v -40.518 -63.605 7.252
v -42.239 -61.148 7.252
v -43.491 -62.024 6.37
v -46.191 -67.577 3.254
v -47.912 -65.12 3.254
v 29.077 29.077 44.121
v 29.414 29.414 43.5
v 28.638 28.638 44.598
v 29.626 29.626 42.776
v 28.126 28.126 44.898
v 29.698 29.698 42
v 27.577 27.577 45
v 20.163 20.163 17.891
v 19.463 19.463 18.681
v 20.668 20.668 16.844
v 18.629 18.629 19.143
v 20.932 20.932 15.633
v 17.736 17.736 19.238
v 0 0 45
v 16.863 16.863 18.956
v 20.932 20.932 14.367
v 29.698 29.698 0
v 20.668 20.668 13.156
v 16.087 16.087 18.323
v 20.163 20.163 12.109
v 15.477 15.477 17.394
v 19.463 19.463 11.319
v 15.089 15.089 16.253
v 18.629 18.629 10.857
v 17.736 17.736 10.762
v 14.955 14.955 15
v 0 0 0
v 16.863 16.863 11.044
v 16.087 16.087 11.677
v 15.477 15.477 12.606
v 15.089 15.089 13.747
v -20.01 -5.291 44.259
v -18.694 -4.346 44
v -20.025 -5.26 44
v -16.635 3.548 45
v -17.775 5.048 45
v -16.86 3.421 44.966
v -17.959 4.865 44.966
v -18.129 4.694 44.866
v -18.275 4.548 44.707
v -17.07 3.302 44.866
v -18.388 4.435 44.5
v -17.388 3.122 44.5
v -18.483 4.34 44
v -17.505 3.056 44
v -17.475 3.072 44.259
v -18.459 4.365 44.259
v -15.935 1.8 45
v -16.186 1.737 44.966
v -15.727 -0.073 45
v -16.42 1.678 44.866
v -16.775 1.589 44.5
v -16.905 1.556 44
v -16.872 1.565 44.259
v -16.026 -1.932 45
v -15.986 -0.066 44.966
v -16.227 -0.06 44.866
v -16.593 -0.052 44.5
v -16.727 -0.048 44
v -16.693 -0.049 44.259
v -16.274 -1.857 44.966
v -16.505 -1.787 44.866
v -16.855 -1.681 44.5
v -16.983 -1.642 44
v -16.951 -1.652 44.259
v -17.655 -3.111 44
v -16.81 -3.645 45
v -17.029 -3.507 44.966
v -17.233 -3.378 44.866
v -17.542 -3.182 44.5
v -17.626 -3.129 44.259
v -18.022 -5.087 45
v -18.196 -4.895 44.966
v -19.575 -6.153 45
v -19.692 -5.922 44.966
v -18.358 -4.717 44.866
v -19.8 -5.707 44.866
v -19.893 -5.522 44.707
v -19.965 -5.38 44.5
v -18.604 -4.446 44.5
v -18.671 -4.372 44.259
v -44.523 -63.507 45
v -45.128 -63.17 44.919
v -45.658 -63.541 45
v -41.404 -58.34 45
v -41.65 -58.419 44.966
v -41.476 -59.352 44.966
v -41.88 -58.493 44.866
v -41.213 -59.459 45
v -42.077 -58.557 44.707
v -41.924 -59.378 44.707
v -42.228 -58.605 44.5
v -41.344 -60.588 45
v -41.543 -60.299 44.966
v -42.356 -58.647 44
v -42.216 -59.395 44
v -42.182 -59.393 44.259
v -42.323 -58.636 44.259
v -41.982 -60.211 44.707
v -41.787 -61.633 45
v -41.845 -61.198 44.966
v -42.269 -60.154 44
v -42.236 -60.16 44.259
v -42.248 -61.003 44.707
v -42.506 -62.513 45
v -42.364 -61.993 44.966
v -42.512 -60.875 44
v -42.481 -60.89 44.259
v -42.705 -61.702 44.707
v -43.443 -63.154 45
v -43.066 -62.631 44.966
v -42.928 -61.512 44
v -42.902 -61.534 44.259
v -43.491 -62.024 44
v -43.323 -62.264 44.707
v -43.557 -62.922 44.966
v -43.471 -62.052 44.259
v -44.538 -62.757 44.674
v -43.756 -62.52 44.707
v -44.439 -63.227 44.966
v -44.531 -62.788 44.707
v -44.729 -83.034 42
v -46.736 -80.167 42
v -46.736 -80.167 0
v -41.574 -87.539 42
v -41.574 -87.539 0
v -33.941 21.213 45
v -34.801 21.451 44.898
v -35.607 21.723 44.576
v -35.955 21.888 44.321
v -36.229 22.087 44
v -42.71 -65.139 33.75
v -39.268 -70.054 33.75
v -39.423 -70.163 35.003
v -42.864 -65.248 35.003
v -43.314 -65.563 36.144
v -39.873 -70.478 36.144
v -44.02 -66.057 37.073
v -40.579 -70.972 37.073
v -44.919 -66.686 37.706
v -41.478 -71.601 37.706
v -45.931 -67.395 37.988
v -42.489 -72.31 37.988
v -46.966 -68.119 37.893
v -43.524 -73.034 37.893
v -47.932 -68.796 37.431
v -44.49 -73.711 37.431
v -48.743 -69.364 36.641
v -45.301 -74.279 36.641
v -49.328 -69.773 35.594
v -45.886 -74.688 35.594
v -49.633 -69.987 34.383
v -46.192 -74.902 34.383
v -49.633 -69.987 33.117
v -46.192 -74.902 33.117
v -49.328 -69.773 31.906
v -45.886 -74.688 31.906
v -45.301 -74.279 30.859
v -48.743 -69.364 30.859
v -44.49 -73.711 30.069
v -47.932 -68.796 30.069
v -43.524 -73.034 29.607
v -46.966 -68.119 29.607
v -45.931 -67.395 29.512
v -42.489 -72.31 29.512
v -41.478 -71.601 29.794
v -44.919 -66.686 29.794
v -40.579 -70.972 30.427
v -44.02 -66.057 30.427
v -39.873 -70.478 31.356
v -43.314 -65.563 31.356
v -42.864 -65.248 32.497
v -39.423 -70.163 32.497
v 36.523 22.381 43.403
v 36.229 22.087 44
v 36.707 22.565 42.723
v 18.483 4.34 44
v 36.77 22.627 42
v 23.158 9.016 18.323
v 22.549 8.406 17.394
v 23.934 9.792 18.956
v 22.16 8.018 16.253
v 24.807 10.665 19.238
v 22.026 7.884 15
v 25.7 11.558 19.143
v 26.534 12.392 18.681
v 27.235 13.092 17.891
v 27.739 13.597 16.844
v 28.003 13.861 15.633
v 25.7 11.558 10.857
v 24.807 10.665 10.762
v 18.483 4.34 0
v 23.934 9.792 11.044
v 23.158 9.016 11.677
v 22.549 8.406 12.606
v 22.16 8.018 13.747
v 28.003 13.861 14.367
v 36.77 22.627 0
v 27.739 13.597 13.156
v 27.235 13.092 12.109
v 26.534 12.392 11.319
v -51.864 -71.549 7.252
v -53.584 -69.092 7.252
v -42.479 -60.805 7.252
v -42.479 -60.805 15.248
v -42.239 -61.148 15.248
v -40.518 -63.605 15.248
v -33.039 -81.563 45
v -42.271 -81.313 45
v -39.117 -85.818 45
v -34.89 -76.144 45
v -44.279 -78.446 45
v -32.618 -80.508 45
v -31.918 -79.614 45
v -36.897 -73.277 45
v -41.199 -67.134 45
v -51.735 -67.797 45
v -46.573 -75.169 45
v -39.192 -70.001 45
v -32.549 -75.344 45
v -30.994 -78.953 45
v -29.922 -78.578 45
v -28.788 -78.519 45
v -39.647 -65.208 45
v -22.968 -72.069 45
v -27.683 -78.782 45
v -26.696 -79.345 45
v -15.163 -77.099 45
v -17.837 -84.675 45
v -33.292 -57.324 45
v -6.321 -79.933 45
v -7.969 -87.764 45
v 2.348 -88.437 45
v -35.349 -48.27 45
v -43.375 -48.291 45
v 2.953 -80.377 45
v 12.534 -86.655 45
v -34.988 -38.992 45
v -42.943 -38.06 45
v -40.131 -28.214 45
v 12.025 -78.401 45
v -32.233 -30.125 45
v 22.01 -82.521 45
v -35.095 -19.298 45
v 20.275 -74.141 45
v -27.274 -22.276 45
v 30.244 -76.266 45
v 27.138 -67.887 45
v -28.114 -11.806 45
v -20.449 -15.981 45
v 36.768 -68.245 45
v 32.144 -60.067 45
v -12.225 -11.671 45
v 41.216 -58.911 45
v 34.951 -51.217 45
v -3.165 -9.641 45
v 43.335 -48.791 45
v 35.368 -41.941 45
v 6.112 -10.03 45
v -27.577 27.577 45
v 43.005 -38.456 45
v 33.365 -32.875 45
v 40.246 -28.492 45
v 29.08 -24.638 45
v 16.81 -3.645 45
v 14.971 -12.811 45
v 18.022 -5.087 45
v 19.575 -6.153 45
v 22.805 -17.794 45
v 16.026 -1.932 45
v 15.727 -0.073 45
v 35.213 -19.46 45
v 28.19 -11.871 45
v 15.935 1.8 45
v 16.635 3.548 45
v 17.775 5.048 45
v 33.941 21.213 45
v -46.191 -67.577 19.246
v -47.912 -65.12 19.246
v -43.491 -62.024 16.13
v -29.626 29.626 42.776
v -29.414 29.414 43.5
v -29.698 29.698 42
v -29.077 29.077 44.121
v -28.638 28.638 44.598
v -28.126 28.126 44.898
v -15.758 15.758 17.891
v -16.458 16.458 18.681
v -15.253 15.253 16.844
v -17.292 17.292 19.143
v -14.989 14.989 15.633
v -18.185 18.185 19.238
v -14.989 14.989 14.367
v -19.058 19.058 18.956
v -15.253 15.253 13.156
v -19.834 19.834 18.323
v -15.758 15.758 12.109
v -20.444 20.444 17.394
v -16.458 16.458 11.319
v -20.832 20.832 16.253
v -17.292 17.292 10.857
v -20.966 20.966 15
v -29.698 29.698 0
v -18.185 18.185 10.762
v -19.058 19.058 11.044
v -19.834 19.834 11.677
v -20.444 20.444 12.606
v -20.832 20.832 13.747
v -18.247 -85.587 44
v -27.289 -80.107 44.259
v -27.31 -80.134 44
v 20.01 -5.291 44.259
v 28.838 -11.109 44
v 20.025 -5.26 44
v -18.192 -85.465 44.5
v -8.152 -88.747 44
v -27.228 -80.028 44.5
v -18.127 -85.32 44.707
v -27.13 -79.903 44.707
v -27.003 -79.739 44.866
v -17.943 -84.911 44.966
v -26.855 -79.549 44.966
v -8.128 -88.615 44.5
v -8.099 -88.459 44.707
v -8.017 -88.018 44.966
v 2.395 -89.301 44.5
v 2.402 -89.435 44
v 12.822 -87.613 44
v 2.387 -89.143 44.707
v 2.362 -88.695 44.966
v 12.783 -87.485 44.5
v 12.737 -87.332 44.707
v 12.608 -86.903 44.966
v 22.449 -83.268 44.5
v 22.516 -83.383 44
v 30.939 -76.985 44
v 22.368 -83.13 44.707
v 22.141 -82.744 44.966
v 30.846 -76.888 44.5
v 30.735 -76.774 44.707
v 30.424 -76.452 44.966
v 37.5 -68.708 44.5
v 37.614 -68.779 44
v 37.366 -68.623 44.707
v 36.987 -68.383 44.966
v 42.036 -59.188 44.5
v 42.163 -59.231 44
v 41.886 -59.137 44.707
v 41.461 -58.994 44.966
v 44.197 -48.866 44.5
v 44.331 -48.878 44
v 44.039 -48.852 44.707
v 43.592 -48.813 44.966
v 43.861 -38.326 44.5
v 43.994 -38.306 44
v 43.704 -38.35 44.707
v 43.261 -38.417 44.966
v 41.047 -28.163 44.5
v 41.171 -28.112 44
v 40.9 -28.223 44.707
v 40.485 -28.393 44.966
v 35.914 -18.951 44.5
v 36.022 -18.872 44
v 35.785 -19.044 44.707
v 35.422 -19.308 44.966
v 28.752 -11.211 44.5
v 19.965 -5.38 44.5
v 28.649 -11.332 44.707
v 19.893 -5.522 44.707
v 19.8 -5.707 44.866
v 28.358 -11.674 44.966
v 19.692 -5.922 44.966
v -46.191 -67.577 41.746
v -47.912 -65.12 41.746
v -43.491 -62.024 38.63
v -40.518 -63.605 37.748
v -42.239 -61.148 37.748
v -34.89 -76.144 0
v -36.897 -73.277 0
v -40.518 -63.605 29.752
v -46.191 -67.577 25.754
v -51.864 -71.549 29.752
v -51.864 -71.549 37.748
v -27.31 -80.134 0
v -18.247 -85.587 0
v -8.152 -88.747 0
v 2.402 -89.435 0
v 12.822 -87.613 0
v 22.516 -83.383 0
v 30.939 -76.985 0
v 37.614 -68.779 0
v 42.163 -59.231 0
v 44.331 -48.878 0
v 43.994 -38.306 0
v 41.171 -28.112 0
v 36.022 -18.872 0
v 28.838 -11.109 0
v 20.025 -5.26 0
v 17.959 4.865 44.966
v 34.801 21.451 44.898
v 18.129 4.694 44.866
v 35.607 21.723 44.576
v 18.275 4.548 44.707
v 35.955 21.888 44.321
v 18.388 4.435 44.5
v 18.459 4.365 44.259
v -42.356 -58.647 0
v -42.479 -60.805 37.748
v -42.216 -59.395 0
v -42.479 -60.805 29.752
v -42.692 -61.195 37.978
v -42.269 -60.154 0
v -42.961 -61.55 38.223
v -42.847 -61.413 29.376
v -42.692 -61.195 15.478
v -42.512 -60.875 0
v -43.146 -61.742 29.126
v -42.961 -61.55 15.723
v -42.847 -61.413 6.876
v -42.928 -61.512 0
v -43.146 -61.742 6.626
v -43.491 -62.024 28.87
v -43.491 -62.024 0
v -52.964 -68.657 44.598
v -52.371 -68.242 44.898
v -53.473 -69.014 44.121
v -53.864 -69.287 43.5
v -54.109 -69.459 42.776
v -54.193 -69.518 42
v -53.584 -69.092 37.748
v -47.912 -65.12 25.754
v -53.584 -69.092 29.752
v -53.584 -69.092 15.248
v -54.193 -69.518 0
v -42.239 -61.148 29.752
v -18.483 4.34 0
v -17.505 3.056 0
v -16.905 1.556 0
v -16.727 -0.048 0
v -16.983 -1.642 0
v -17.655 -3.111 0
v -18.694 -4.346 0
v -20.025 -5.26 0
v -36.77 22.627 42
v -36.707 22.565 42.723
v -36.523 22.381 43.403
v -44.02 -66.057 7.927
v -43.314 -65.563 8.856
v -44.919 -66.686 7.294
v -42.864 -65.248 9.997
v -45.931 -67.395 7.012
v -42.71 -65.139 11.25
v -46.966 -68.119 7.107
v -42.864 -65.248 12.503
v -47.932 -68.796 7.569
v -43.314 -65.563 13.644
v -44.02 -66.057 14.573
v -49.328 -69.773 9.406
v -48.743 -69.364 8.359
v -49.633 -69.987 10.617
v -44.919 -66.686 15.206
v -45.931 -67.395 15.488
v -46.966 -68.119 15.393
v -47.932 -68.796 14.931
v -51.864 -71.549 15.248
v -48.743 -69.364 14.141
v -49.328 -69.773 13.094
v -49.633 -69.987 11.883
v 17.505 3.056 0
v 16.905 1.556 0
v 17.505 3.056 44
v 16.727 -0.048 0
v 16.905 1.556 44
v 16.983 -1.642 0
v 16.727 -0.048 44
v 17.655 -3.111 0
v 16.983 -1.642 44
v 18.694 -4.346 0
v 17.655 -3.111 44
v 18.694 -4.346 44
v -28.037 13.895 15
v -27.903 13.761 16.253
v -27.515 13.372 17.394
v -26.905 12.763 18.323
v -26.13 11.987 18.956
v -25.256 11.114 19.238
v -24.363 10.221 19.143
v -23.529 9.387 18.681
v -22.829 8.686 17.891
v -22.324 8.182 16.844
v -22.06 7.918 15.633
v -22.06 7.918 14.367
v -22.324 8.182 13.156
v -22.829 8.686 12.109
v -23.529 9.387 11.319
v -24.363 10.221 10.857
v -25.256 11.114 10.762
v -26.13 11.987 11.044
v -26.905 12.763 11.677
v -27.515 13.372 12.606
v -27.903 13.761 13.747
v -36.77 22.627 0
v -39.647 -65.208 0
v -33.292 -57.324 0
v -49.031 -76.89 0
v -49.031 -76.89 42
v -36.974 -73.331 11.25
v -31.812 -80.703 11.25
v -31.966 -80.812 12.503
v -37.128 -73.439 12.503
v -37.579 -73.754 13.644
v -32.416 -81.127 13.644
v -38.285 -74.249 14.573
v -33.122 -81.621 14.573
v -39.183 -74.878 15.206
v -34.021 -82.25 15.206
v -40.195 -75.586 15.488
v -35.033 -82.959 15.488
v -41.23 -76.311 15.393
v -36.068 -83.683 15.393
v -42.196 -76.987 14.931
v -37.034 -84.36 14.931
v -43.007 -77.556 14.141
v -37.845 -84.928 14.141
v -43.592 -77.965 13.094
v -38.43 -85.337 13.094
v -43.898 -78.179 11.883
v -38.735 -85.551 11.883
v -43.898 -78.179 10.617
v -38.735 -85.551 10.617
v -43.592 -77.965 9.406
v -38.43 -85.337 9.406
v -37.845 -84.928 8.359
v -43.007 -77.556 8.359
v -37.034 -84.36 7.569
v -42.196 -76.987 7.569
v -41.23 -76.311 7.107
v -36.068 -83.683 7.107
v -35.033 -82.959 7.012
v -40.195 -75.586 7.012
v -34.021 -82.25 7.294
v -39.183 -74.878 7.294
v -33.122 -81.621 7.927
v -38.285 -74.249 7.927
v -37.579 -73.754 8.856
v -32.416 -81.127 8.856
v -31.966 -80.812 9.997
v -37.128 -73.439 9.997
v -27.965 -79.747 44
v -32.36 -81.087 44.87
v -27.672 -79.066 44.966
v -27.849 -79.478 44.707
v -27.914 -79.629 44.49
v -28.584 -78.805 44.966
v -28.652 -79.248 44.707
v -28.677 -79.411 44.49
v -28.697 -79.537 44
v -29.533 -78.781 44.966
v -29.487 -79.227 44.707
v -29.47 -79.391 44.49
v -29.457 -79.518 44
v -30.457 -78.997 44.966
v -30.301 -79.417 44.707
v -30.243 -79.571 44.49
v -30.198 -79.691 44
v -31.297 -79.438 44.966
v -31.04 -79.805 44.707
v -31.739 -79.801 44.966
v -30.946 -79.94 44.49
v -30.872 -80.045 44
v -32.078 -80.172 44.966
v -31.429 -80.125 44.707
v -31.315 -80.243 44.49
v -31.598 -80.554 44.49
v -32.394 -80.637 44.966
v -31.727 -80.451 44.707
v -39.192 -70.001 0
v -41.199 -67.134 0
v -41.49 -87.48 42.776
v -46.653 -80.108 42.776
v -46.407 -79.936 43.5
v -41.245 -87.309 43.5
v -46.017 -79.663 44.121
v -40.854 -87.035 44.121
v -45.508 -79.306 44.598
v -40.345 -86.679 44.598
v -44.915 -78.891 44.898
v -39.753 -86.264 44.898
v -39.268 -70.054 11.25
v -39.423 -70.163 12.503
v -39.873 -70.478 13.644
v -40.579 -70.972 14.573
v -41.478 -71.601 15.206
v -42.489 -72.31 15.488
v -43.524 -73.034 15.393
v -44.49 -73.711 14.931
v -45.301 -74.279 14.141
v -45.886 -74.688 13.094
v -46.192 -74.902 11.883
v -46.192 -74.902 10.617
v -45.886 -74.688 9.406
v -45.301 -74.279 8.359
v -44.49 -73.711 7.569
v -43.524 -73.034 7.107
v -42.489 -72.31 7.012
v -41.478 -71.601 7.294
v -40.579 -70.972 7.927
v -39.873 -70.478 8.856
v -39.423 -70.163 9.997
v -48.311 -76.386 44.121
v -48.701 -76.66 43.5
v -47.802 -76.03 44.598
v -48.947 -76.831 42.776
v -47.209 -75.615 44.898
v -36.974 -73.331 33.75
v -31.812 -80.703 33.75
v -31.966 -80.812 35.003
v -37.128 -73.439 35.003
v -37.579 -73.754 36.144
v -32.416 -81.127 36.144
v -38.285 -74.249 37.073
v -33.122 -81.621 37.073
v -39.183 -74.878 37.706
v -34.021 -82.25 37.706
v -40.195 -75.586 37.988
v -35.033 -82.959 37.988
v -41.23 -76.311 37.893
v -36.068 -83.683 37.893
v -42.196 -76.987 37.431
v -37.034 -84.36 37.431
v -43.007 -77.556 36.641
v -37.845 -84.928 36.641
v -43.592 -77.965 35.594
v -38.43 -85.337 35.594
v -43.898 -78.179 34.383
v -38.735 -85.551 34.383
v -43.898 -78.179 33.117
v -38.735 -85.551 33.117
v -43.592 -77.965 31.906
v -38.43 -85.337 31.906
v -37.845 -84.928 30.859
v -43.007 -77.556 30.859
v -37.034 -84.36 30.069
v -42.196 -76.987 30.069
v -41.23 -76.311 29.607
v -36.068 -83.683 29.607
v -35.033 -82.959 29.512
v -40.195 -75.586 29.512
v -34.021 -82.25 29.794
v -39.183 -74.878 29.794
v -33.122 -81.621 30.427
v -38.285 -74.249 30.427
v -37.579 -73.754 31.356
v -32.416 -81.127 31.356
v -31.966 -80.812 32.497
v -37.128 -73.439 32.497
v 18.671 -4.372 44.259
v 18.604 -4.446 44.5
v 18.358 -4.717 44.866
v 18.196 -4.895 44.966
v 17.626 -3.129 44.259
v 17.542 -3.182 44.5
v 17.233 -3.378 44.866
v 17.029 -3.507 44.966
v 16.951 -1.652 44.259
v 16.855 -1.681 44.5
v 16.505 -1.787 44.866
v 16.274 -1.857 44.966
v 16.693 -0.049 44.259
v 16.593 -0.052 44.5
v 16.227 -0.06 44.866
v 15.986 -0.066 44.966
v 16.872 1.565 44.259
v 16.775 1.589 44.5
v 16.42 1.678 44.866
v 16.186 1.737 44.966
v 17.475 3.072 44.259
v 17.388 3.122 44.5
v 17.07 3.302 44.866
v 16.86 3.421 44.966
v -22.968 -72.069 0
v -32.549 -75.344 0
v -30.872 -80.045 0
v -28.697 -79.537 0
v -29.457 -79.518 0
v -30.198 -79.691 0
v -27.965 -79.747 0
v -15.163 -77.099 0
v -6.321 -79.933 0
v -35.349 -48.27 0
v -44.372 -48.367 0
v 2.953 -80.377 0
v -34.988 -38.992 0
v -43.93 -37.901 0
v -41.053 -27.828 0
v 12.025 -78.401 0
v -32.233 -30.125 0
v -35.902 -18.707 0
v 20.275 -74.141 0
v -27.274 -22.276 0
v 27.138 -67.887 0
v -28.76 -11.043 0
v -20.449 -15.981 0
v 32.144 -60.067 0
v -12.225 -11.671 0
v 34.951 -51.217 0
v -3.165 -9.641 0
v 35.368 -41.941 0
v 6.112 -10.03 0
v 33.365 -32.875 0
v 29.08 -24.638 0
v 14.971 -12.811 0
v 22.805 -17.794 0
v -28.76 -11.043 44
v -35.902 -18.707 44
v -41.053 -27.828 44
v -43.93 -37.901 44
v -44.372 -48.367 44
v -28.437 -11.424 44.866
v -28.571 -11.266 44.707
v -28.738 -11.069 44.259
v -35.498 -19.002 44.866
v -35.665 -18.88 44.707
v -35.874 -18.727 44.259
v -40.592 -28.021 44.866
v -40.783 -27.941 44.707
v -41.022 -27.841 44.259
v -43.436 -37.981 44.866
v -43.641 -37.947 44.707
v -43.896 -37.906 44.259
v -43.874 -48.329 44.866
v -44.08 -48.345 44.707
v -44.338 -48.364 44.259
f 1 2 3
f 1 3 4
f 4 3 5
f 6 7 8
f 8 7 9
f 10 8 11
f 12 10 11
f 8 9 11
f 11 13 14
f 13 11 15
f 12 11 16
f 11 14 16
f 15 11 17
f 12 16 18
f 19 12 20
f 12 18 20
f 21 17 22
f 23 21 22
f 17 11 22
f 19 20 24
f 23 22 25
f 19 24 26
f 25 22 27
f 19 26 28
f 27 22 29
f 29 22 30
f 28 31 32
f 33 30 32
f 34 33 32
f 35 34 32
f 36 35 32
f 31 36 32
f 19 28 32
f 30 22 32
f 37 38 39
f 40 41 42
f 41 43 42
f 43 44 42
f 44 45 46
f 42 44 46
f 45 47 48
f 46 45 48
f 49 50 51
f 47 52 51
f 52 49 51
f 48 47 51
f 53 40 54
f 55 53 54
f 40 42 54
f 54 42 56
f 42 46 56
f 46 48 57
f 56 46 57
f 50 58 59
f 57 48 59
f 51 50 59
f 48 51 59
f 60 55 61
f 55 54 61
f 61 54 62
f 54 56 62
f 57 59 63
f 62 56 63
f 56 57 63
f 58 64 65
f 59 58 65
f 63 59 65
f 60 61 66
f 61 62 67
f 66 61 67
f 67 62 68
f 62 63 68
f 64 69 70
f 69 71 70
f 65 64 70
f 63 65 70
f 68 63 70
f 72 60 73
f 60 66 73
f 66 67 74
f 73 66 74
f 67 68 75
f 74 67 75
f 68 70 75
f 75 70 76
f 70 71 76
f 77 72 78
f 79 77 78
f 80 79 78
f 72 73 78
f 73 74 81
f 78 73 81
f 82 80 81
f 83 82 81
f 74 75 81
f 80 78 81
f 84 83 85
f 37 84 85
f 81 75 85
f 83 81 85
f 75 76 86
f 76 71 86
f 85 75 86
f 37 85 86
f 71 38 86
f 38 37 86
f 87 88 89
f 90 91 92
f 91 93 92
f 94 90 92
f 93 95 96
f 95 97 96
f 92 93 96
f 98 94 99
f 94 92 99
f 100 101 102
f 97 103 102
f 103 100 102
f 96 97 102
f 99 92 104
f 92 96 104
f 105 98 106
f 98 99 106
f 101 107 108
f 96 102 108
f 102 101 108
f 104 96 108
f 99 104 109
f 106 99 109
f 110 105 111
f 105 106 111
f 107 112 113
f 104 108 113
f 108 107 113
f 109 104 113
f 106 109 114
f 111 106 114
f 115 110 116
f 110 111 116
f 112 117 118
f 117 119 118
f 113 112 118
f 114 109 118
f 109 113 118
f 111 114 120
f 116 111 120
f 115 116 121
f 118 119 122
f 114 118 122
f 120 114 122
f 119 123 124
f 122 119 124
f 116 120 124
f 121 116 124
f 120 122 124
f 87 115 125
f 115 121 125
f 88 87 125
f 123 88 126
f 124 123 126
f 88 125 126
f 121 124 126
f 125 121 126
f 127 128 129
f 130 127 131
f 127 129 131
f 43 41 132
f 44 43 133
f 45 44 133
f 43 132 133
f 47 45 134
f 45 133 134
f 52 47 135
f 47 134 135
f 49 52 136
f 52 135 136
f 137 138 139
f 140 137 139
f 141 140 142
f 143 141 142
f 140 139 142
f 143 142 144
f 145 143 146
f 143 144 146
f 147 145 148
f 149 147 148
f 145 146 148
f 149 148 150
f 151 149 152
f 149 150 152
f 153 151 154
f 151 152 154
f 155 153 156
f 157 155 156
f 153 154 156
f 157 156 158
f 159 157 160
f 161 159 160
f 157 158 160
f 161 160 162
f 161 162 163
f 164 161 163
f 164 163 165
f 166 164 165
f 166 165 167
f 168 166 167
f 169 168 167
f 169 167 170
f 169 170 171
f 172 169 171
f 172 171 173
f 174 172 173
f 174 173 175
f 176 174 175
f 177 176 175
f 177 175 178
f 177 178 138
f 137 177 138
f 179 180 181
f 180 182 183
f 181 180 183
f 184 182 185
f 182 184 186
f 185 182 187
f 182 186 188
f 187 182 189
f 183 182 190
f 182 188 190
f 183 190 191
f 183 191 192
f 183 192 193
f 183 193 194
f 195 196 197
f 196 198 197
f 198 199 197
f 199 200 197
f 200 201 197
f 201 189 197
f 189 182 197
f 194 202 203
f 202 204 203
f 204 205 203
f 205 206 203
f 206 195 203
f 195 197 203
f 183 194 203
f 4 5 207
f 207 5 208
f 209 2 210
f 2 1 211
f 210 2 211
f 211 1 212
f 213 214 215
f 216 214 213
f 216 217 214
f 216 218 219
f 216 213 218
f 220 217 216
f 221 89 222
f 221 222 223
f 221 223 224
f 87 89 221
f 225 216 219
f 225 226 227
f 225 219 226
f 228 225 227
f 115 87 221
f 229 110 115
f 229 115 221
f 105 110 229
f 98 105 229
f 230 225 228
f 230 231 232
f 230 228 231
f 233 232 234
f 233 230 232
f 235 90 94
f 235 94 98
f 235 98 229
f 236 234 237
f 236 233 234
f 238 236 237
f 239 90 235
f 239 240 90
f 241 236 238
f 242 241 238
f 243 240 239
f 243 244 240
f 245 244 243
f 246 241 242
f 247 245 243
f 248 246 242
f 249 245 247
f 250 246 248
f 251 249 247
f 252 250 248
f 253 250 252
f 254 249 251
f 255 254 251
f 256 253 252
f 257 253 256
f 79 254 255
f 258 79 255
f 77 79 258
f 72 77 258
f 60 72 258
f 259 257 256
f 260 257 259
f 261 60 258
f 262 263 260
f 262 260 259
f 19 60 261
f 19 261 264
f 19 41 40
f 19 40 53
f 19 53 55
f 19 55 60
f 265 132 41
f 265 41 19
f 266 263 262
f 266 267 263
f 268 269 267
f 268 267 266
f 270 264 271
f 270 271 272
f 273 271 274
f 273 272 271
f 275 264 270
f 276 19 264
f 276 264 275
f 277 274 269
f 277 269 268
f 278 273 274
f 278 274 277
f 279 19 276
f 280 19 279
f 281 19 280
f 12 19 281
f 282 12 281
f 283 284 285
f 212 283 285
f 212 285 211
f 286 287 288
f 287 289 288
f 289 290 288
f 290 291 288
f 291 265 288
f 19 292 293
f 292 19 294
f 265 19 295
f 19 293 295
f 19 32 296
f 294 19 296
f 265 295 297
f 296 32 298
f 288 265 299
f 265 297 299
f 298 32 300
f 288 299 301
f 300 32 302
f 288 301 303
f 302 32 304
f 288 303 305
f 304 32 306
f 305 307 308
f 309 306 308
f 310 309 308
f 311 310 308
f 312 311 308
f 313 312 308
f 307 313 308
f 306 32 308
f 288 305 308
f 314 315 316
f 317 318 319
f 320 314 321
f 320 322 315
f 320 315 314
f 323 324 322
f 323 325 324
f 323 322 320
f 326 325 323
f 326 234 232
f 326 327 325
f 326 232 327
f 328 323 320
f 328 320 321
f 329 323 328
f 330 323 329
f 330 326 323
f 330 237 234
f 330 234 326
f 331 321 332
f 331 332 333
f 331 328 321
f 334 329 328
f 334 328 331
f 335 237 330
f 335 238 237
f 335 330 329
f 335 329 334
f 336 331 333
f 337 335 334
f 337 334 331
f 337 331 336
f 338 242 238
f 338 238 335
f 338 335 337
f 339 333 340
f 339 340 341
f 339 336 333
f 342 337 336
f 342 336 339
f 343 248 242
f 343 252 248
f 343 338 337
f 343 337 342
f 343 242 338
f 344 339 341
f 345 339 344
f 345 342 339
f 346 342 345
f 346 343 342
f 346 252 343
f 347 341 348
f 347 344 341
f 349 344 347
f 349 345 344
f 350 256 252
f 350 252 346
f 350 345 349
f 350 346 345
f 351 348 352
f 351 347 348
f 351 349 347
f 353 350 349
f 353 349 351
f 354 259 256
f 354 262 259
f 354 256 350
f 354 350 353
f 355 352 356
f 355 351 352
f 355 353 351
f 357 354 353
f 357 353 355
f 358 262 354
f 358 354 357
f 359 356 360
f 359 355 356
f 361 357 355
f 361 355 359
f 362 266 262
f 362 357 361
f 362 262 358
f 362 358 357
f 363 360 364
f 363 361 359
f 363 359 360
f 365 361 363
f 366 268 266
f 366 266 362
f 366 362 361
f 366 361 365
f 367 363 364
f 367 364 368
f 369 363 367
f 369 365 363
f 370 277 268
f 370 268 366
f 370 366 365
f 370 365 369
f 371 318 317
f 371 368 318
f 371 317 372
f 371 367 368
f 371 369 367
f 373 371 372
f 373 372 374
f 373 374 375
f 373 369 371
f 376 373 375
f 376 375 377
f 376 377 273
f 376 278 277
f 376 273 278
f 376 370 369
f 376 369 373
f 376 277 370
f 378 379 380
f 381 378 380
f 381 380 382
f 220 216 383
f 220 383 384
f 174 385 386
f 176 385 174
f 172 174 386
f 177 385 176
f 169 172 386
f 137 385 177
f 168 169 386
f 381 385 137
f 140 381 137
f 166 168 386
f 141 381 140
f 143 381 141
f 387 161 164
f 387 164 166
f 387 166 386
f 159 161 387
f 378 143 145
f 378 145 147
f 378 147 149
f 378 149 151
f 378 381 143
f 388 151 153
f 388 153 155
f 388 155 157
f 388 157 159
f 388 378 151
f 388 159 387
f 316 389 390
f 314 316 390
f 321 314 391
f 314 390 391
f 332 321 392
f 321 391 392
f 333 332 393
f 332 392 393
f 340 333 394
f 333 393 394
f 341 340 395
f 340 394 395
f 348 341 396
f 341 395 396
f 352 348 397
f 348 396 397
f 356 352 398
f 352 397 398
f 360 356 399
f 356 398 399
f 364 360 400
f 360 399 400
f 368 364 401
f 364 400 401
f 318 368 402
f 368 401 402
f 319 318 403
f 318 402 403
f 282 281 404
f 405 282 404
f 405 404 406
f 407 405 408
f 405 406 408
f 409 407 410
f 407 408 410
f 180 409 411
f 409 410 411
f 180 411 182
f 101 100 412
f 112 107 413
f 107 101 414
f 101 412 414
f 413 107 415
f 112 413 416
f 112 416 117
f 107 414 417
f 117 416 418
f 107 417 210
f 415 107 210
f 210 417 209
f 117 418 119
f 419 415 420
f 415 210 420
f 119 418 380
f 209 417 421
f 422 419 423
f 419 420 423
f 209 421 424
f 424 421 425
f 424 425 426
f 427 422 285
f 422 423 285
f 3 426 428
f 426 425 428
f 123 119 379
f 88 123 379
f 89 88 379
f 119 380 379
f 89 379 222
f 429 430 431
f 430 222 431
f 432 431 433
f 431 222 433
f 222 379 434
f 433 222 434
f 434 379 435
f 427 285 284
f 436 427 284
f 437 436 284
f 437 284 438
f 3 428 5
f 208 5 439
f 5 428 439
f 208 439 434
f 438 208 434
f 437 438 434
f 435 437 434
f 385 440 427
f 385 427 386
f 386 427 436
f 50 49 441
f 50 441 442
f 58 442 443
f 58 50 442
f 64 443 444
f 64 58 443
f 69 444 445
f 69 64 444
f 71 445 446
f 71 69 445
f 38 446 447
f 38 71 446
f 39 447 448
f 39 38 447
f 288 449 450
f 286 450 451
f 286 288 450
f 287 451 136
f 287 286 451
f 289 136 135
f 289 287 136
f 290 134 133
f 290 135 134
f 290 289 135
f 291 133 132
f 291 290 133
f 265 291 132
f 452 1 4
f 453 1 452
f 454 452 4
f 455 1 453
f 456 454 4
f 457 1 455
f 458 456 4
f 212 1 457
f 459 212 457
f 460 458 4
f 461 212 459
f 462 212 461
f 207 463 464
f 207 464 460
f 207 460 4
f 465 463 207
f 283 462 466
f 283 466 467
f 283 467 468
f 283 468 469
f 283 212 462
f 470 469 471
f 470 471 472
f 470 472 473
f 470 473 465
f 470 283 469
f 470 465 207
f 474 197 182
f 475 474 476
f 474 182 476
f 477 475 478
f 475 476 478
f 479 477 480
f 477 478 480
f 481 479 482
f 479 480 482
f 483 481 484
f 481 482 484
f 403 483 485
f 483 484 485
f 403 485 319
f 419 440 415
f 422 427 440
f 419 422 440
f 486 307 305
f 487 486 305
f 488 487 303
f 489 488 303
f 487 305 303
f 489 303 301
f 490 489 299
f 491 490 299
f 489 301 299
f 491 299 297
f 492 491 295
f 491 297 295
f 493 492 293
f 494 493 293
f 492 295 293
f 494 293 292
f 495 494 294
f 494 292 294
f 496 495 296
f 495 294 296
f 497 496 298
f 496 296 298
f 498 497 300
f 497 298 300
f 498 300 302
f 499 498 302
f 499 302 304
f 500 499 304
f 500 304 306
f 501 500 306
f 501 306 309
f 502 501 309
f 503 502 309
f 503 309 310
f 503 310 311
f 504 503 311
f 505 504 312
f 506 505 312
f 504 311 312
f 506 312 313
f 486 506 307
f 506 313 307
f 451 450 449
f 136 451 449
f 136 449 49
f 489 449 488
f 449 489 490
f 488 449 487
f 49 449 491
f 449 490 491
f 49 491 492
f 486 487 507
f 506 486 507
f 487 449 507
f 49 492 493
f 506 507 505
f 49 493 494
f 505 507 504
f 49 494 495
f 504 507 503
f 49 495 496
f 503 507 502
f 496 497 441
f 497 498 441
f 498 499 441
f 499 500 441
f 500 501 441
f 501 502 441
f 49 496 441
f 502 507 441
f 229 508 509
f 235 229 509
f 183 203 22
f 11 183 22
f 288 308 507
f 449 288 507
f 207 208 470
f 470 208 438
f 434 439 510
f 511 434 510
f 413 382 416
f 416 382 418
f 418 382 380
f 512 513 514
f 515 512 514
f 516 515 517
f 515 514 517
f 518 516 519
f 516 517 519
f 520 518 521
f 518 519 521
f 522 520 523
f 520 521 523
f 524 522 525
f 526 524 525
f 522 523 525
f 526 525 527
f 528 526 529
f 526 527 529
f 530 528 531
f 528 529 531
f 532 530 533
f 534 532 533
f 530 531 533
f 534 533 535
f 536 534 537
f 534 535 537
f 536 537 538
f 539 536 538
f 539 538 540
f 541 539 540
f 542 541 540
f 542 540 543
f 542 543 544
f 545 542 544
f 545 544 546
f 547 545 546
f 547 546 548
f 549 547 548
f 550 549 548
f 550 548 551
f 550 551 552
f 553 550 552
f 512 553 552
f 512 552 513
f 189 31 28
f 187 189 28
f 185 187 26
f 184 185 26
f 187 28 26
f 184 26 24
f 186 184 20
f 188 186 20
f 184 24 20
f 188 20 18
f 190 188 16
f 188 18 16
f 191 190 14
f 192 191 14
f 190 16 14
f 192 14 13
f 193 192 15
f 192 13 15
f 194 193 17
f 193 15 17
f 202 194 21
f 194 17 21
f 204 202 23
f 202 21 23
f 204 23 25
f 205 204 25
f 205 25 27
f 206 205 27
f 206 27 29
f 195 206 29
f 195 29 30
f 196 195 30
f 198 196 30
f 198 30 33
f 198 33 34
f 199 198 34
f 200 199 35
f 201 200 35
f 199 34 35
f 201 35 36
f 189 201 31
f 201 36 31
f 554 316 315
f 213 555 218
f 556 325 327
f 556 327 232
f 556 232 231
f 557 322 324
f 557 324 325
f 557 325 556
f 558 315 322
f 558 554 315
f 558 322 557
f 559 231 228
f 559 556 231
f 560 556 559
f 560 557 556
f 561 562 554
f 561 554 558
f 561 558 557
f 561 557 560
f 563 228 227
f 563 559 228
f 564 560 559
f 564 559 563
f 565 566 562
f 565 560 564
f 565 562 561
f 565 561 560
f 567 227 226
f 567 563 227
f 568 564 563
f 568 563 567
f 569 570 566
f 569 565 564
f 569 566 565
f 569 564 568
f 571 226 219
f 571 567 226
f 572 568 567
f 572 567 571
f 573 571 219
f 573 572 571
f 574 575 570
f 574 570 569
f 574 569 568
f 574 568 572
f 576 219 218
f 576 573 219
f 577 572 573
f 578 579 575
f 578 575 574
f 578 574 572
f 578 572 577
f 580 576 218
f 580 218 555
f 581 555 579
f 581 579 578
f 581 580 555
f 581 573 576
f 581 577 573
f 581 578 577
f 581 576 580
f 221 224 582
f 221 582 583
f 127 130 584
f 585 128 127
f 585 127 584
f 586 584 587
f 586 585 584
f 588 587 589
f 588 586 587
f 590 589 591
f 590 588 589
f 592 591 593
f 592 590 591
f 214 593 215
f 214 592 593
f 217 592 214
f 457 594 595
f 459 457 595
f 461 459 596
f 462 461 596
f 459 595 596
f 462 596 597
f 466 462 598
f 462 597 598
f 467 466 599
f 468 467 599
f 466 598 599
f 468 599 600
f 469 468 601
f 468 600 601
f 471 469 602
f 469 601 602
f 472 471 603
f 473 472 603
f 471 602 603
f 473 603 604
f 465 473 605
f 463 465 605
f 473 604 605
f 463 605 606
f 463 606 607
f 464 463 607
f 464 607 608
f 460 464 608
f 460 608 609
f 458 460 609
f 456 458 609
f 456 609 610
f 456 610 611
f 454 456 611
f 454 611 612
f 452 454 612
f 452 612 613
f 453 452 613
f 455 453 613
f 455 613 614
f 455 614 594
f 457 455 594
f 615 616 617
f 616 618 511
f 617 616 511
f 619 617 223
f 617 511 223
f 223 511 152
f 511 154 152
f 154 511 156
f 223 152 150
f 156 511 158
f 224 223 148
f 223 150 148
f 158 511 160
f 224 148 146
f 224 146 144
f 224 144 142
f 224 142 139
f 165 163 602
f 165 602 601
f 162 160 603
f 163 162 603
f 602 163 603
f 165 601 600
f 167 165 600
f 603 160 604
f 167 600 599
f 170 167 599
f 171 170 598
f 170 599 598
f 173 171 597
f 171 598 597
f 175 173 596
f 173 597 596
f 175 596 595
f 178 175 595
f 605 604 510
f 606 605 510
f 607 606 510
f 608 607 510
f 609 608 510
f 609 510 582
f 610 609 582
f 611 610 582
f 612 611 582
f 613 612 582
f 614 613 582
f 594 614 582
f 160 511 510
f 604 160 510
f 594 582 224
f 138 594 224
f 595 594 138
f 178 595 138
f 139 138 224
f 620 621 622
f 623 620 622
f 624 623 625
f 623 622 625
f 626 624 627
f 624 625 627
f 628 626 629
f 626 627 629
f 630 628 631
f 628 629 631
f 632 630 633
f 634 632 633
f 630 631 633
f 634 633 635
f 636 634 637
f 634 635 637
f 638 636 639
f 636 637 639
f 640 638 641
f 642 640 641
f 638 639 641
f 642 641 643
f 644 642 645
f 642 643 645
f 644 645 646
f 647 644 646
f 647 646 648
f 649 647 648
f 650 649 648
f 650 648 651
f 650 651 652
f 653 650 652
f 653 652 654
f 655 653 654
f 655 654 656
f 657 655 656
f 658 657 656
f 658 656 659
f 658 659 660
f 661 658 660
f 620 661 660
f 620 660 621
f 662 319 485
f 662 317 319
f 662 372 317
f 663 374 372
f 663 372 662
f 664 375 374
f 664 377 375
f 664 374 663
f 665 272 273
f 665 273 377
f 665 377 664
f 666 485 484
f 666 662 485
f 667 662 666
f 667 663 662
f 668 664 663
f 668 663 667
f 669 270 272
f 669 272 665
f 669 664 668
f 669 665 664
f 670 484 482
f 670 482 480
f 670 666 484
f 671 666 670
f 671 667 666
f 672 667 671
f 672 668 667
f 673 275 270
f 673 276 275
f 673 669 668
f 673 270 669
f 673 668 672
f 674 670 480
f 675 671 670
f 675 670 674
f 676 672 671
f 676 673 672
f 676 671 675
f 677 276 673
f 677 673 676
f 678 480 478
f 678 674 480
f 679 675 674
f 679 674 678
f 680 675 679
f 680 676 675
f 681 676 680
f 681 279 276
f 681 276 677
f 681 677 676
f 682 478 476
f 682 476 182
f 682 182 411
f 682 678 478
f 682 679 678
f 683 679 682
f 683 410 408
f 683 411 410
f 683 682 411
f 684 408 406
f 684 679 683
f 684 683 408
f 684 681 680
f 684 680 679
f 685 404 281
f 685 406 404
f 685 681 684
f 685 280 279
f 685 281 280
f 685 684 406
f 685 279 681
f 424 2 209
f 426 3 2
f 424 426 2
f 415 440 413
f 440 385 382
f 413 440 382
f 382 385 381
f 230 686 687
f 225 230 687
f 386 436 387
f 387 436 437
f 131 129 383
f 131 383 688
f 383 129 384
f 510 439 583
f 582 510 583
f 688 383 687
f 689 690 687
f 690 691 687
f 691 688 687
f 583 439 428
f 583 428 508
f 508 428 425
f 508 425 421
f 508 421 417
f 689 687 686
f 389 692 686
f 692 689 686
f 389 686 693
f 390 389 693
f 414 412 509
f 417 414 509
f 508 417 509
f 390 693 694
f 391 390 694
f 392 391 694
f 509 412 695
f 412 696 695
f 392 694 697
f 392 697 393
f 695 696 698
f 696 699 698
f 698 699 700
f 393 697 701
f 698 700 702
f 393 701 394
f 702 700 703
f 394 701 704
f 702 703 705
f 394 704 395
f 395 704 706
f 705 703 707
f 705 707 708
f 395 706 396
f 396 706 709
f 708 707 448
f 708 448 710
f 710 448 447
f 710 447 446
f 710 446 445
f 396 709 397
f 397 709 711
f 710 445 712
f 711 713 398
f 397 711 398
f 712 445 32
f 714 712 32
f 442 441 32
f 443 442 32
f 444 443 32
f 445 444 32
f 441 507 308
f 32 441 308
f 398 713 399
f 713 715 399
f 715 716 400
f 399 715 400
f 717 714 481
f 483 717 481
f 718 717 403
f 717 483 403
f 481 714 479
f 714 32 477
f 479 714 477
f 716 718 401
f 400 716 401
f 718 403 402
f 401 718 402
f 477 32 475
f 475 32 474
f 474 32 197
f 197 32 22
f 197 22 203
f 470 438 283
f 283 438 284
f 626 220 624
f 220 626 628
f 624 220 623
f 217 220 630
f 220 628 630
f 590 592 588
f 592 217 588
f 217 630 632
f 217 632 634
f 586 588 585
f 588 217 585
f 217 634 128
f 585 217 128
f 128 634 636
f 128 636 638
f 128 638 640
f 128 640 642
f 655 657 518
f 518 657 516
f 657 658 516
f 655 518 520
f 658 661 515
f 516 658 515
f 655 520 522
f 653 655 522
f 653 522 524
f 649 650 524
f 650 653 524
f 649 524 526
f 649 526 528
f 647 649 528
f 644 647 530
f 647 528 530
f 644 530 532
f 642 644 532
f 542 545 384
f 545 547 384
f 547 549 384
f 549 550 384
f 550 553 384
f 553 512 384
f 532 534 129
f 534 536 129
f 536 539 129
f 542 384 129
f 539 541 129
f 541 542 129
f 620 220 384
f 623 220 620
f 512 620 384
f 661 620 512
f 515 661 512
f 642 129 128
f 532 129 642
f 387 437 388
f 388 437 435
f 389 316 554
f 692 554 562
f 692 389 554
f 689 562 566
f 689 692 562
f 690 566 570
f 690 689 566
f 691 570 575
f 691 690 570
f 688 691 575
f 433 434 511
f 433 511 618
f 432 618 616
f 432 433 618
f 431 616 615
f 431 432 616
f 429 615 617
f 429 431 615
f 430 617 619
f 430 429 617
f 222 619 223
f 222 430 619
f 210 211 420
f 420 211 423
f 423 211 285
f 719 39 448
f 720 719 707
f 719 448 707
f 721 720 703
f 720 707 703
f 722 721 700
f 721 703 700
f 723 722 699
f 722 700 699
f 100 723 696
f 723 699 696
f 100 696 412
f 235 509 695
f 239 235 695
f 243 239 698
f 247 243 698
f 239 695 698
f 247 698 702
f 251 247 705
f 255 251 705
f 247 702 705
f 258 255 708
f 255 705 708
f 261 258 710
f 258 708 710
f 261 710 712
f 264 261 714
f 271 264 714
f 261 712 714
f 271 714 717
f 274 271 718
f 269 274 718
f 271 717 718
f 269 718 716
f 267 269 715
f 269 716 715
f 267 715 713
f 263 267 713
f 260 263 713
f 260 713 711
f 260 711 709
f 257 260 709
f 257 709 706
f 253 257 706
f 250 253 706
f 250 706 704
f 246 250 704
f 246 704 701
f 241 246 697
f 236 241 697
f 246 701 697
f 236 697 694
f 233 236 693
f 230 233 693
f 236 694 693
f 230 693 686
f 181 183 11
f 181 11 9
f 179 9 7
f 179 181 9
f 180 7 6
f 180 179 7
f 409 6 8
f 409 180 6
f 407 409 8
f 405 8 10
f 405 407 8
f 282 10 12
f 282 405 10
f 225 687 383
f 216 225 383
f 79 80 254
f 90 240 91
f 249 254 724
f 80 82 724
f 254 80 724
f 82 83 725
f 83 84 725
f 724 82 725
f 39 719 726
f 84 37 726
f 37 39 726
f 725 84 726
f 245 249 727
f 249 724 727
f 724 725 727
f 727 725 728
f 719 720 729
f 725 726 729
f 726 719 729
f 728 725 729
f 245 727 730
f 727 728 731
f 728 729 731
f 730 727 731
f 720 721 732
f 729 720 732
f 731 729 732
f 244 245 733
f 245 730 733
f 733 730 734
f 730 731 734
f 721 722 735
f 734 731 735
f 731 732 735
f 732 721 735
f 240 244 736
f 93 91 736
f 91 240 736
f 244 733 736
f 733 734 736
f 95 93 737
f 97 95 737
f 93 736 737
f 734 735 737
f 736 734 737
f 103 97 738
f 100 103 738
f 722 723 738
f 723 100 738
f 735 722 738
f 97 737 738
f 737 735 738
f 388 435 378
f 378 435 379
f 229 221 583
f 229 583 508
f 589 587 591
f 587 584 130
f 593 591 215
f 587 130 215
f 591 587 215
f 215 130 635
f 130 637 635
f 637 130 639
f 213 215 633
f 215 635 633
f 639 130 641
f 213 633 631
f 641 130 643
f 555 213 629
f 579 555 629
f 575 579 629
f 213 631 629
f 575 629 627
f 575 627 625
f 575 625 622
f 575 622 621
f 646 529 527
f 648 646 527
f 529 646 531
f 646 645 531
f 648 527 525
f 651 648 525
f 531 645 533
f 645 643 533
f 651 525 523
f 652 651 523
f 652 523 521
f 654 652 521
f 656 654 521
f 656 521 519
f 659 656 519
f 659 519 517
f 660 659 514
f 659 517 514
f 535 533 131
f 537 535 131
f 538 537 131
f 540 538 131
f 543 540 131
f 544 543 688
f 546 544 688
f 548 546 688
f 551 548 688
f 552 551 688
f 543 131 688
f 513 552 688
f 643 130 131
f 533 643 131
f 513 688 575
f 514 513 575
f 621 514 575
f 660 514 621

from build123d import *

# Parameters (mm, degrees)
F1_DEPTH      = 45
F2_R          = 4.25
F3_DEPTH      = 10
F4_R          = 4.25
F5_DEPTH      = 10
F6_R          = 4.25
F7_DEPTH      = 22
F9_DEPTH      = 3
F10_R         = 6
F11_T1_DEPTH  = 45
F11_T6_DEPTH  = 45
F11_T11_DEPTH = 50.6773888561
F11_T16_DEPTH = 56.3547777122
F11_T22_DEPTH = 50.6773888561
F11_T24_DEPTH = 24
F11_T26_DEPTH = 24
F11_T28_DEPTH = 25
F11_T30_DEPTH = 25
F12_T3_ANGLE  = 191.1142548037
F12_T6_ANGLE  = 120.6172934525
F12_T9_ANGLE  = 108.2560127517
F12_T12_DEPTH = 25.3616591831
F12_T15_DEPTH = 25.3616591831
F12_T18_ANGLE = 108.2560127517
F12_T21_ANGLE = 120.6172934336
F12_T24_ANGLE = 81.1142548036


# Not quite as in the source:
# - a fillet or chamfer that OpenCascade refuses, or shapes differently, is made with other operations: its cross-section is extruded or revolved along the edge and cut away or added


with BuildPart() as f1:
    # F0 (on Top) → F1 (new body)
    with BuildSketch(Plane.XY):
        with BuildLine():
            Line((29.6984848098, 29.6984848098), (0, 0))
            Line((0, 0), (-29.6984848098, 29.6984848098))
            Line((-29.6984848098, 29.6984848098), (-36.7695526217, 22.627416998))
            Line((-36.7695526217, 22.627416998), (-11.9950181388, -2.1471174849))
            ThreePointArc((-11.9950181388, -2.1471174849), (-39.7071381913, -24.9103714156), (-41.6303752657, -60.7213821032))
            ThreePointArc((-41.6303752657, -60.7213821032), (-40.7005404194, -62.9921096474), (-39.6469587391, -65.2081335788))
            Line((-39.6469587391, -65.2081335788), (-33.2920408775, -57.324366686))
            ThreePointArc((-33.2920408775, -57.324366686), (29.0798975723, -24.6380365095), (-22.9676650232, -72.0691034832))
            Line((-22.9676650232, -72.0691034832), (-32.5494925143, -75.3443658208))
            ThreePointArc((-32.5494925143, -75.3443658208), (-30.8274573358, -77.0923335738), (-29.011693666, -78.7427270775))
            ThreePointArc((-29.011693666, -78.7427270775), (39.2315391454, -66.0032458512), (11.9950181388, -2.1471174849))
            Line((11.9950181388, -2.1471174849), (36.7695526217, 22.627416998))
            Line((36.7695526217, 22.627416998), (29.6984848098, 29.6984848098))
        make_face()
        with BuildLine():
            ThreePointArc((-39.6469587391, -65.2081335788), (-40.7005404194, -62.9921096474), (-41.6303752657, -60.7213821032))
            Line((-41.6303752657, -60.7213821032), (-54.1929009582, -69.517757292))
            Line((-54.1929009582, -69.517757292), (-49.0307130311, -76.8901256906))
            Line((-49.0307130311, -76.8901256906), (-39.1915368437, -70.0006603545))
            Line((-39.1915368437, -70.0006603545), (-41.1990543709, -67.1336281995))
            Line((-41.1990543709, -67.1336281995), (-39.6469587391, -65.2081335788))
        make_face()
        with BuildLine():
            Line((-41.5742193585, -87.5391022664), (-29.011693666, -78.7427270775))
            ThreePointArc((-29.011693666, -78.7427270775), (-30.8274573358, -77.0923335738), (-32.5494925143, -75.3443658208))
            Line((-32.5494925143, -75.3443658208), (-34.8897135711, -76.1443006866))
            Line((-34.8897135711, -76.1443006866), (-36.8972310983, -73.2772685316))
            Line((-36.8972310983, -73.2772685316), (-46.7364072857, -80.1667338678))
            Line((-46.7364072857, -80.1667338678), (-41.5742193585, -87.5391022664))
        make_face()
    extrude(amount=F1_DEPTH)

    # F2 (on face) → F3 (cut, through all)
    with BuildSketch(Plane(origin=(0, 0, 0), x_dir=(-0.7071067812, -0.7071067812, 0), z_dir=(-0.7071067812, 0.7071067812, 0))):
        with Locations((-25.4, 15)):
            Circle(F2_R)
    extrude(amount=-F3_DEPTH, mode=Mode.SUBTRACT)

    # F4 (on face) → F5 (cut, through all)
    with BuildSketch(Plane(origin=(0, 0, 0), x_dir=(-0.7071067812, 0.7071067812, 0), z_dir=(0.7071067812, 0.7071067812, 0))):
        with Locations((25.4, 15)):
            Circle(F4_R)
    extrude(amount=-F5_DEPTH, mode=Mode.SUBTRACT)

    # F6 (on face) → F7 (cut, through all)
    with BuildSketch(Plane(origin=(27.4524247675, -39.206125712, 0), x_dir=(0.8191520443, 0.5735764364, 0), z_dir=(0.5735764364, -0.8191520443, 0))):
        with Locations((-76.5979670285, 33.75)):
            Circle(F6_R)
        with Locations((-76.5979670285, 11.25)):
            Circle(F6_R)
    extrude(amount=-F7_DEPTH, mode=Mode.SUBTRACT)

    # F8 (on face) → F9 (cut)
    with BuildSketch(Plane(origin=(14.8337431678, -21.1847807376, 0), x_dir=(-0.8191520443, -0.5735764364, 0), z_dir=(-0.5735764364, 0.8191520443, 0))):
        Polygon((83.5229670285, 37.7481506141), (76.5979670285, 41.7463012283), (69.6729670285, 37.7481506141), (69.6729670285, 29.7518493859), (76.5979670285, 25.7536987717), (83.5229670285, 29.7518493859), align=None)
        Polygon((76.5979670285, 19.2463012283), (69.6729670285, 15.2481506141), (69.6729670285, 7.2518493859), (76.5979670285, 3.2536987717), (83.5229670285, 7.2518493859), (83.5229670285, 15.2481506141), align=None)
    extrude(amount=-F9_DEPTH, mode=Mode.SUBTRACT)

    # F10
    f10_edges = [f1.edges().sort_by_distance(p)[0] for p in [
        (-11.995018, -2.147117, 22.5),
        (11.995018, -2.147117, 22.5),
    ]]
    fillet(f10_edges, radius=F10_R)

    # F11: fillet of radius 3 on 6 edges, made by hand

    # F11_s2 → F11_t1 (join)
    with BuildSketch(Plane.XY):
        with BuildLine():
            ThreePointArc((-27.3100924069, -80.1341550735), (-29.0764013889, -79.5036829691), (-30.8719515411, -80.0452936647))
            Line((-30.8719515411, -80.0452936647), (-29.011693666, -78.7427270775))
            ThreePointArc((-29.011693666, -78.7427270775), (-28.169485522, -79.4489489742), (-27.3100924069, -80.1341550735))
        make_face()
    extrude(amount=F11_T1_DEPTH)


with BuildPart() as f11_tool4:
    # F11_s5 → F11_t6 (new body)
    with BuildSketch(Plane.XY):
        with BuildLine():
            ThreePointArc((-42.3559079793, -58.6465035538), (-42.3675712465, -60.5219252298), (-43.4906331408, -62.0239486903))
            Line((-43.4906331408, -62.0239486903), (-41.6303752657, -60.7213821032))
            ThreePointArc((-41.6303752657, -60.7213821032), (-42.0059546205, -59.6884232108), (-42.3559079793, -58.6465035538))
        make_face()
    extrude(amount=F11_T6_DEPTH)

    split(bisect_by=Plane(origin=(-57.0727533731, -39.9627721382, 0), x_dir=(0, 0, 1), z_dir=(0.8191520443, 0.5735764364, 0)), keep=Keep.TOP)


with BuildPart() as f1_1:
    add(f1.part)

    # F11_t3: union F11_tool4
    add(f11_tool4.part)


with BuildPart() as f11_tool9:
    # F11_s10 → F11_t11 (new body)
    with BuildSketch(Plane.XY):
        with BuildLine():
            ThreePointArc((-42.3559079793, -58.6465035538), (-42.3675712465, -60.5219252298), (-43.4906331408, -62.0239486903))
            Line((-43.4906331408, -62.0239486903), (-41.6303752657, -60.7213821032))
            ThreePointArc((-41.6303752657, -60.7213821032), (-42.0059546205, -59.6884232108), (-42.3559079793, -58.6465035538))
        make_face()
    extrude(amount=F11_T11_DEPTH)

    split(bisect_by=Plane(origin=(-16.8404428161, -11.7918050066, 35.6081667412), x_dir=(-0.5735764364, 0.8191520443, 0), z_dir=(0.4095760221, 0.2867882182, -0.8660254038)), keep=Keep.TOP)


with BuildPart() as f1_2:
    add(f1_1.part)

    # F11_t8: union F11_tool9
    add(f11_tool9.part)


with BuildPart() as f11_tool14:
    # F11_s15 → F11_t16 (new body)
    with BuildSketch(Plane.XY.offset(-5.6773888561)):
        with BuildLine():
            ThreePointArc((-42.3559079793, -58.6465035538), (-42.3675712465, -60.5219252298), (-43.4906331408, -62.0239486903))
            Line((-43.4906331408, -62.0239486903), (-41.6303752657, -60.7213821032))
            ThreePointArc((-41.6303752657, -60.7213821032), (-42.0059546205, -59.6884232108), (-42.3559079793, -58.6465035538))
        make_face()
    extrude(amount=F11_T16_DEPTH)

    split(bisect_by=Plane(origin=(-24.8212657152, -17.3800373617, 52.4831667412), x_dir=(-0.5735764364, 0.8191520443, 0), z_dir=(0.4095760221, 0.2867882182, -0.8660254038)), keep=Keep.TOP)

    split(bisect_by=Plane(origin=(-8.8596199171, -6.2035726516, -18.7331667412), x_dir=(-0.5735764364, 0.8191520443, 0), z_dir=(0.4095760221, 0.2867882182, 0.8660254038)), keep=Keep.TOP)


with BuildPart() as f1_3:
    add(f1_2.part)

    # F11_t13: union F11_tool14
    add(f11_tool14.part)


with BuildPart() as f11_tool20:
    # F11_s21 → F11_t22 (new body)
    with BuildSketch(Plane.XY.offset(-5.6773888561)):
        with BuildLine():
            ThreePointArc((-42.3559079793, -58.6465035538), (-42.3675712465, -60.5219252298), (-43.4906331408, -62.0239486903))
            Line((-43.4906331408, -62.0239486903), (-41.6303752657, -60.7213821032))
            ThreePointArc((-41.6303752657, -60.7213821032), (-42.0059546205, -59.6884232108), (-42.3559079793, -58.6465035538))
        make_face()
    extrude(amount=F11_T22_DEPTH)

    split(bisect_by=Plane(origin=(-0.878797018, -0.6153402966, -1.8581667412), x_dir=(-0.5735764364, 0.8191520443, 0), z_dir=(0.4095760221, 0.2867882182, 0.8660254038)), keep=Keep.TOP)


with BuildPart() as f1_4:
    add(f1_3.part)

    # F11_t19: union F11_tool20
    add(f11_tool20.part)

    # F11_s25 → F11_t24 (cut)
    with BuildSketch(Plane(origin=(10.5319198952, -15.0411404055, 0), x_dir=(0, 0, 1), z_dir=(0.5735764364, -0.8191520443, 0))):
        with BuildLine():
            ThreePointArc((42, 84.2659730966), (44.1213203436, 83.3872934401), (45, 81.2659730966))
            Line((45, 81.2659730966), (45, 84.2659730966))
            Line((45, 84.2659730966), (42, 84.2659730966))
        make_face()
    extrude(amount=F11_T24_DEPTH, mode=Mode.SUBTRACT)

    # F11_s27 → F11_t26 (cut)
    with BuildSketch(Plane(origin=(17.9884135678, -25.6901169812, 0), x_dir=(0, 0, 1), z_dir=(0.5735764364, -0.8191520443, 0))):
        with BuildLine():
            ThreePointArc((42, 84.2659730966), (44.1213203436, 83.3872934401), (45, 81.2659730966))
            Line((45, 81.2659730966), (45, 84.2659730966))
            Line((45, 84.2659730966), (42, 84.2659730966))
        make_face()
    extrude(amount=F11_T26_DEPTH, mode=Mode.SUBTRACT)

    # F11_s29 → F11_t28 (cut)
    with BuildSketch(Plane(origin=(5.3033008589, 5.3033008589, 0), x_dir=(0, 0, 1), z_dir=(-0.7071067812, -0.7071067812, 0))):
        with BuildLine():
            ThreePointArc((42, 42), (44.1213203436, 41.1213203436), (45, 39))
            Line((45, 39), (45, 42))
            Line((45, 42), (42, 42))
        make_face()
    extrude(amount=F11_T28_DEPTH, mode=Mode.SUBTRACT)

    # F11_s31 → F11_t30 (cut)
    with BuildSketch(Plane(origin=(12.3743686708, -12.3743686708, 0), x_dir=(0, 0, 1), z_dir=(-0.7071067812, 0.7071067812, 0))):
        with BuildLine():
            ThreePointArc((42, 42), (44.1213203436, 41.1213203436), (45, 39))
            Line((45, 39), (45, 42))
            Line((45, 42), (42, 42))
        make_face()
    extrude(amount=F11_T30_DEPTH, mode=Mode.SUBTRACT)

    # F12: fillet of radius 1 on 8 edges, made by hand


with BuildPart() as f12_tool1:
    # F12_s2 → F12_t3 (revolve)
    with BuildSketch(Plane(origin=(21.8044519511, -16.9487951659, 0), x_dir=(0, 0, 1), z_dir=(-0.7895315747, 0.6137099417, 0))):
        with BuildLine():
            ThreePointArc((44, -80.0289208608), (44.7071067812, -79.736027642), (45, -79.0289208608))
            Line((45, -79.0289208608), (45, -80.0289208608))
            Line((45, -80.0289208608), (44, -80.0289208608))
        make_face()
    revolve(axis=Axis((0, -45, 45), (0, 0, 1)), revolution_arc=F12_T3_ANGLE)


with BuildPart() as f12_tool4:
    # F12_s5 → F12_t6 (revolve)
    with BuildSketch(Plane(origin=(21.8044519524, -16.9487951679, 0), x_dir=(0, 0, 1), z_dir=(0.7895315747, -0.6137099417, 0))):
        with BuildLine():
            ThreePointArc((45, 79.0289208601), (44.7071067812, 79.7360276413), (44, 80.0289208601))
            Line((44, 80.0289208601), (45, 80.0289208601))
            Line((45, 80.0289208601), (45, 79.0289208601))
        make_face()
    revolve(axis=Axis((-29.1512222321, -82.5027497974, 45), (0, 0, 1)), revolution_arc=F12_T6_ANGLE)


with BuildPart() as f12_tool7:
    # F12_s8 → F12_t9 (revolve)
    with BuildSketch(Plane(origin=(-11.4115302287, 11.4115302287, 0), x_dir=(0, 0, 1), z_dir=(-0.7071067812, 0.7071067812, 0))):
        with BuildLine():
            ThreePointArc((45, -9), (44.7071067812, -9.7071067812), (44, -10))
            Line((44, -10), (45, -10))
            Line((45, -10), (45, -9))
        make_face()
    revolve(axis=Axis((-22.7252387277, 0.0978217297, 45), (0, 0, -1)), revolution_arc=F12_T9_ANGLE)


with BuildPart() as f12_tool10:
    # F12_s11 → F12_t12 (new body)
    with BuildSketch(Plane(origin=(-29.3449314192, 29.3449314192, 0), x_dir=(0, 0, 1), z_dir=(0.7071067812, -0.7071067812, 0))):
        with BuildLine():
            ThreePointArc((45, 9), (44.7071067812, 9.7071067812), (44, 10))
            Line((44, 10), (45, 10))
            Line((45, 10), (45, 9))
        make_face()
    extrude(amount=F12_T12_DEPTH)


with BuildPart() as f12_tool13:
    # F12_s14 → F12_t15 (new body)
    with BuildSketch(Plane(origin=(11.4115302287, 11.4115302287, 0), x_dir=(0, 0, 1), z_dir=(0.7071067812, 0.7071067812, 0))):
        with BuildLine():
            ThreePointArc((45, 9), (44.7071067812, 9.7071067812), (44, 10))
            Line((44, 10), (45, 10))
            Line((45, 10), (45, 9))
        make_face()
    extrude(amount=F12_T15_DEPTH)


with BuildPart() as f12_tool16:
    # F12_s17 → F12_t18 (revolve)
    with BuildSketch(Plane(origin=(18.0839699719, -9.1126914559, 0), x_dir=(0, 0, 1), z_dir=(0.8930261729, -0.4500047273, 0))):
        with BuildLine():
            ThreePointArc((44, -4.313822221), (44.7071067812, -4.0209290022), (45, -3.313822221))
            Line((45, -3.313822221), (45, -4.313822221))
            Line((45, -4.313822221), (44, -4.313822221))
        make_face()
    revolve(axis=Axis((22.7252387277, 0.0978217298, 45), (0, 0, -1)), revolution_arc=F12_T18_ANGLE)


with BuildPart() as f12_tool19:
    # F12_s20 → F12_t21 (revolve)
    with BuildSketch(Plane(origin=(13.1349335644, -40.7681011714, 0), x_dir=(0, 0, 1), z_dir=(-0.3066630011, 0.9518181569, 0))):
        with BuildLine():
            ThreePointArc((45, -57.299835051), (44.7071067812, -58.0069418322), (44, -58.299835051))
            Line((44, -58.299835051), (45, -58.299835051))
            Line((45, -58.299835051), (45, -57.299835051))
        make_face()
    revolve(axis=Axis((-45.2113624502, -59.5664925573, 45), (0, 0, -1)), revolution_arc=F12_T21_ANGLE)


with BuildPart() as f12_tool22:
    # F12_s23 → F12_t24 (revolve)
    with BuildSketch(Plane(origin=(-18.0839699719, -9.1126914559, 0), x_dir=(0, 0, 1), z_dir=(0.8930261729, 0.4500047273, 0))):
        with BuildLine():
            ThreePointArc((45, -3.313822221), (44.7071067812, -4.0209290022), (44, -4.313822221))
            Line((44, -4.313822221), (45, -4.313822221))
            Line((45, -4.313822221), (45, -3.313822221))
        make_face()
    revolve(axis=Axis((0, -45, 45), (0, 0, 1)), revolution_arc=F12_T24_ANGLE)


with BuildPart() as f1_5:
    add(f1_4.part)

    # F12_t25: cut F12_tool1, F12_tool4, F12_tool7, F12_tool10, F12_tool13, F12_tool16, F12_tool19, F12_tool22
    add([f12_tool1.part, f12_tool4.part, f12_tool7.part, f12_tool10.part, f12_tool13.part, f12_tool16.part, f12_tool19.part, f12_tool22.part], mode=Mode.SUBTRACT)


solid = f1_5.part
